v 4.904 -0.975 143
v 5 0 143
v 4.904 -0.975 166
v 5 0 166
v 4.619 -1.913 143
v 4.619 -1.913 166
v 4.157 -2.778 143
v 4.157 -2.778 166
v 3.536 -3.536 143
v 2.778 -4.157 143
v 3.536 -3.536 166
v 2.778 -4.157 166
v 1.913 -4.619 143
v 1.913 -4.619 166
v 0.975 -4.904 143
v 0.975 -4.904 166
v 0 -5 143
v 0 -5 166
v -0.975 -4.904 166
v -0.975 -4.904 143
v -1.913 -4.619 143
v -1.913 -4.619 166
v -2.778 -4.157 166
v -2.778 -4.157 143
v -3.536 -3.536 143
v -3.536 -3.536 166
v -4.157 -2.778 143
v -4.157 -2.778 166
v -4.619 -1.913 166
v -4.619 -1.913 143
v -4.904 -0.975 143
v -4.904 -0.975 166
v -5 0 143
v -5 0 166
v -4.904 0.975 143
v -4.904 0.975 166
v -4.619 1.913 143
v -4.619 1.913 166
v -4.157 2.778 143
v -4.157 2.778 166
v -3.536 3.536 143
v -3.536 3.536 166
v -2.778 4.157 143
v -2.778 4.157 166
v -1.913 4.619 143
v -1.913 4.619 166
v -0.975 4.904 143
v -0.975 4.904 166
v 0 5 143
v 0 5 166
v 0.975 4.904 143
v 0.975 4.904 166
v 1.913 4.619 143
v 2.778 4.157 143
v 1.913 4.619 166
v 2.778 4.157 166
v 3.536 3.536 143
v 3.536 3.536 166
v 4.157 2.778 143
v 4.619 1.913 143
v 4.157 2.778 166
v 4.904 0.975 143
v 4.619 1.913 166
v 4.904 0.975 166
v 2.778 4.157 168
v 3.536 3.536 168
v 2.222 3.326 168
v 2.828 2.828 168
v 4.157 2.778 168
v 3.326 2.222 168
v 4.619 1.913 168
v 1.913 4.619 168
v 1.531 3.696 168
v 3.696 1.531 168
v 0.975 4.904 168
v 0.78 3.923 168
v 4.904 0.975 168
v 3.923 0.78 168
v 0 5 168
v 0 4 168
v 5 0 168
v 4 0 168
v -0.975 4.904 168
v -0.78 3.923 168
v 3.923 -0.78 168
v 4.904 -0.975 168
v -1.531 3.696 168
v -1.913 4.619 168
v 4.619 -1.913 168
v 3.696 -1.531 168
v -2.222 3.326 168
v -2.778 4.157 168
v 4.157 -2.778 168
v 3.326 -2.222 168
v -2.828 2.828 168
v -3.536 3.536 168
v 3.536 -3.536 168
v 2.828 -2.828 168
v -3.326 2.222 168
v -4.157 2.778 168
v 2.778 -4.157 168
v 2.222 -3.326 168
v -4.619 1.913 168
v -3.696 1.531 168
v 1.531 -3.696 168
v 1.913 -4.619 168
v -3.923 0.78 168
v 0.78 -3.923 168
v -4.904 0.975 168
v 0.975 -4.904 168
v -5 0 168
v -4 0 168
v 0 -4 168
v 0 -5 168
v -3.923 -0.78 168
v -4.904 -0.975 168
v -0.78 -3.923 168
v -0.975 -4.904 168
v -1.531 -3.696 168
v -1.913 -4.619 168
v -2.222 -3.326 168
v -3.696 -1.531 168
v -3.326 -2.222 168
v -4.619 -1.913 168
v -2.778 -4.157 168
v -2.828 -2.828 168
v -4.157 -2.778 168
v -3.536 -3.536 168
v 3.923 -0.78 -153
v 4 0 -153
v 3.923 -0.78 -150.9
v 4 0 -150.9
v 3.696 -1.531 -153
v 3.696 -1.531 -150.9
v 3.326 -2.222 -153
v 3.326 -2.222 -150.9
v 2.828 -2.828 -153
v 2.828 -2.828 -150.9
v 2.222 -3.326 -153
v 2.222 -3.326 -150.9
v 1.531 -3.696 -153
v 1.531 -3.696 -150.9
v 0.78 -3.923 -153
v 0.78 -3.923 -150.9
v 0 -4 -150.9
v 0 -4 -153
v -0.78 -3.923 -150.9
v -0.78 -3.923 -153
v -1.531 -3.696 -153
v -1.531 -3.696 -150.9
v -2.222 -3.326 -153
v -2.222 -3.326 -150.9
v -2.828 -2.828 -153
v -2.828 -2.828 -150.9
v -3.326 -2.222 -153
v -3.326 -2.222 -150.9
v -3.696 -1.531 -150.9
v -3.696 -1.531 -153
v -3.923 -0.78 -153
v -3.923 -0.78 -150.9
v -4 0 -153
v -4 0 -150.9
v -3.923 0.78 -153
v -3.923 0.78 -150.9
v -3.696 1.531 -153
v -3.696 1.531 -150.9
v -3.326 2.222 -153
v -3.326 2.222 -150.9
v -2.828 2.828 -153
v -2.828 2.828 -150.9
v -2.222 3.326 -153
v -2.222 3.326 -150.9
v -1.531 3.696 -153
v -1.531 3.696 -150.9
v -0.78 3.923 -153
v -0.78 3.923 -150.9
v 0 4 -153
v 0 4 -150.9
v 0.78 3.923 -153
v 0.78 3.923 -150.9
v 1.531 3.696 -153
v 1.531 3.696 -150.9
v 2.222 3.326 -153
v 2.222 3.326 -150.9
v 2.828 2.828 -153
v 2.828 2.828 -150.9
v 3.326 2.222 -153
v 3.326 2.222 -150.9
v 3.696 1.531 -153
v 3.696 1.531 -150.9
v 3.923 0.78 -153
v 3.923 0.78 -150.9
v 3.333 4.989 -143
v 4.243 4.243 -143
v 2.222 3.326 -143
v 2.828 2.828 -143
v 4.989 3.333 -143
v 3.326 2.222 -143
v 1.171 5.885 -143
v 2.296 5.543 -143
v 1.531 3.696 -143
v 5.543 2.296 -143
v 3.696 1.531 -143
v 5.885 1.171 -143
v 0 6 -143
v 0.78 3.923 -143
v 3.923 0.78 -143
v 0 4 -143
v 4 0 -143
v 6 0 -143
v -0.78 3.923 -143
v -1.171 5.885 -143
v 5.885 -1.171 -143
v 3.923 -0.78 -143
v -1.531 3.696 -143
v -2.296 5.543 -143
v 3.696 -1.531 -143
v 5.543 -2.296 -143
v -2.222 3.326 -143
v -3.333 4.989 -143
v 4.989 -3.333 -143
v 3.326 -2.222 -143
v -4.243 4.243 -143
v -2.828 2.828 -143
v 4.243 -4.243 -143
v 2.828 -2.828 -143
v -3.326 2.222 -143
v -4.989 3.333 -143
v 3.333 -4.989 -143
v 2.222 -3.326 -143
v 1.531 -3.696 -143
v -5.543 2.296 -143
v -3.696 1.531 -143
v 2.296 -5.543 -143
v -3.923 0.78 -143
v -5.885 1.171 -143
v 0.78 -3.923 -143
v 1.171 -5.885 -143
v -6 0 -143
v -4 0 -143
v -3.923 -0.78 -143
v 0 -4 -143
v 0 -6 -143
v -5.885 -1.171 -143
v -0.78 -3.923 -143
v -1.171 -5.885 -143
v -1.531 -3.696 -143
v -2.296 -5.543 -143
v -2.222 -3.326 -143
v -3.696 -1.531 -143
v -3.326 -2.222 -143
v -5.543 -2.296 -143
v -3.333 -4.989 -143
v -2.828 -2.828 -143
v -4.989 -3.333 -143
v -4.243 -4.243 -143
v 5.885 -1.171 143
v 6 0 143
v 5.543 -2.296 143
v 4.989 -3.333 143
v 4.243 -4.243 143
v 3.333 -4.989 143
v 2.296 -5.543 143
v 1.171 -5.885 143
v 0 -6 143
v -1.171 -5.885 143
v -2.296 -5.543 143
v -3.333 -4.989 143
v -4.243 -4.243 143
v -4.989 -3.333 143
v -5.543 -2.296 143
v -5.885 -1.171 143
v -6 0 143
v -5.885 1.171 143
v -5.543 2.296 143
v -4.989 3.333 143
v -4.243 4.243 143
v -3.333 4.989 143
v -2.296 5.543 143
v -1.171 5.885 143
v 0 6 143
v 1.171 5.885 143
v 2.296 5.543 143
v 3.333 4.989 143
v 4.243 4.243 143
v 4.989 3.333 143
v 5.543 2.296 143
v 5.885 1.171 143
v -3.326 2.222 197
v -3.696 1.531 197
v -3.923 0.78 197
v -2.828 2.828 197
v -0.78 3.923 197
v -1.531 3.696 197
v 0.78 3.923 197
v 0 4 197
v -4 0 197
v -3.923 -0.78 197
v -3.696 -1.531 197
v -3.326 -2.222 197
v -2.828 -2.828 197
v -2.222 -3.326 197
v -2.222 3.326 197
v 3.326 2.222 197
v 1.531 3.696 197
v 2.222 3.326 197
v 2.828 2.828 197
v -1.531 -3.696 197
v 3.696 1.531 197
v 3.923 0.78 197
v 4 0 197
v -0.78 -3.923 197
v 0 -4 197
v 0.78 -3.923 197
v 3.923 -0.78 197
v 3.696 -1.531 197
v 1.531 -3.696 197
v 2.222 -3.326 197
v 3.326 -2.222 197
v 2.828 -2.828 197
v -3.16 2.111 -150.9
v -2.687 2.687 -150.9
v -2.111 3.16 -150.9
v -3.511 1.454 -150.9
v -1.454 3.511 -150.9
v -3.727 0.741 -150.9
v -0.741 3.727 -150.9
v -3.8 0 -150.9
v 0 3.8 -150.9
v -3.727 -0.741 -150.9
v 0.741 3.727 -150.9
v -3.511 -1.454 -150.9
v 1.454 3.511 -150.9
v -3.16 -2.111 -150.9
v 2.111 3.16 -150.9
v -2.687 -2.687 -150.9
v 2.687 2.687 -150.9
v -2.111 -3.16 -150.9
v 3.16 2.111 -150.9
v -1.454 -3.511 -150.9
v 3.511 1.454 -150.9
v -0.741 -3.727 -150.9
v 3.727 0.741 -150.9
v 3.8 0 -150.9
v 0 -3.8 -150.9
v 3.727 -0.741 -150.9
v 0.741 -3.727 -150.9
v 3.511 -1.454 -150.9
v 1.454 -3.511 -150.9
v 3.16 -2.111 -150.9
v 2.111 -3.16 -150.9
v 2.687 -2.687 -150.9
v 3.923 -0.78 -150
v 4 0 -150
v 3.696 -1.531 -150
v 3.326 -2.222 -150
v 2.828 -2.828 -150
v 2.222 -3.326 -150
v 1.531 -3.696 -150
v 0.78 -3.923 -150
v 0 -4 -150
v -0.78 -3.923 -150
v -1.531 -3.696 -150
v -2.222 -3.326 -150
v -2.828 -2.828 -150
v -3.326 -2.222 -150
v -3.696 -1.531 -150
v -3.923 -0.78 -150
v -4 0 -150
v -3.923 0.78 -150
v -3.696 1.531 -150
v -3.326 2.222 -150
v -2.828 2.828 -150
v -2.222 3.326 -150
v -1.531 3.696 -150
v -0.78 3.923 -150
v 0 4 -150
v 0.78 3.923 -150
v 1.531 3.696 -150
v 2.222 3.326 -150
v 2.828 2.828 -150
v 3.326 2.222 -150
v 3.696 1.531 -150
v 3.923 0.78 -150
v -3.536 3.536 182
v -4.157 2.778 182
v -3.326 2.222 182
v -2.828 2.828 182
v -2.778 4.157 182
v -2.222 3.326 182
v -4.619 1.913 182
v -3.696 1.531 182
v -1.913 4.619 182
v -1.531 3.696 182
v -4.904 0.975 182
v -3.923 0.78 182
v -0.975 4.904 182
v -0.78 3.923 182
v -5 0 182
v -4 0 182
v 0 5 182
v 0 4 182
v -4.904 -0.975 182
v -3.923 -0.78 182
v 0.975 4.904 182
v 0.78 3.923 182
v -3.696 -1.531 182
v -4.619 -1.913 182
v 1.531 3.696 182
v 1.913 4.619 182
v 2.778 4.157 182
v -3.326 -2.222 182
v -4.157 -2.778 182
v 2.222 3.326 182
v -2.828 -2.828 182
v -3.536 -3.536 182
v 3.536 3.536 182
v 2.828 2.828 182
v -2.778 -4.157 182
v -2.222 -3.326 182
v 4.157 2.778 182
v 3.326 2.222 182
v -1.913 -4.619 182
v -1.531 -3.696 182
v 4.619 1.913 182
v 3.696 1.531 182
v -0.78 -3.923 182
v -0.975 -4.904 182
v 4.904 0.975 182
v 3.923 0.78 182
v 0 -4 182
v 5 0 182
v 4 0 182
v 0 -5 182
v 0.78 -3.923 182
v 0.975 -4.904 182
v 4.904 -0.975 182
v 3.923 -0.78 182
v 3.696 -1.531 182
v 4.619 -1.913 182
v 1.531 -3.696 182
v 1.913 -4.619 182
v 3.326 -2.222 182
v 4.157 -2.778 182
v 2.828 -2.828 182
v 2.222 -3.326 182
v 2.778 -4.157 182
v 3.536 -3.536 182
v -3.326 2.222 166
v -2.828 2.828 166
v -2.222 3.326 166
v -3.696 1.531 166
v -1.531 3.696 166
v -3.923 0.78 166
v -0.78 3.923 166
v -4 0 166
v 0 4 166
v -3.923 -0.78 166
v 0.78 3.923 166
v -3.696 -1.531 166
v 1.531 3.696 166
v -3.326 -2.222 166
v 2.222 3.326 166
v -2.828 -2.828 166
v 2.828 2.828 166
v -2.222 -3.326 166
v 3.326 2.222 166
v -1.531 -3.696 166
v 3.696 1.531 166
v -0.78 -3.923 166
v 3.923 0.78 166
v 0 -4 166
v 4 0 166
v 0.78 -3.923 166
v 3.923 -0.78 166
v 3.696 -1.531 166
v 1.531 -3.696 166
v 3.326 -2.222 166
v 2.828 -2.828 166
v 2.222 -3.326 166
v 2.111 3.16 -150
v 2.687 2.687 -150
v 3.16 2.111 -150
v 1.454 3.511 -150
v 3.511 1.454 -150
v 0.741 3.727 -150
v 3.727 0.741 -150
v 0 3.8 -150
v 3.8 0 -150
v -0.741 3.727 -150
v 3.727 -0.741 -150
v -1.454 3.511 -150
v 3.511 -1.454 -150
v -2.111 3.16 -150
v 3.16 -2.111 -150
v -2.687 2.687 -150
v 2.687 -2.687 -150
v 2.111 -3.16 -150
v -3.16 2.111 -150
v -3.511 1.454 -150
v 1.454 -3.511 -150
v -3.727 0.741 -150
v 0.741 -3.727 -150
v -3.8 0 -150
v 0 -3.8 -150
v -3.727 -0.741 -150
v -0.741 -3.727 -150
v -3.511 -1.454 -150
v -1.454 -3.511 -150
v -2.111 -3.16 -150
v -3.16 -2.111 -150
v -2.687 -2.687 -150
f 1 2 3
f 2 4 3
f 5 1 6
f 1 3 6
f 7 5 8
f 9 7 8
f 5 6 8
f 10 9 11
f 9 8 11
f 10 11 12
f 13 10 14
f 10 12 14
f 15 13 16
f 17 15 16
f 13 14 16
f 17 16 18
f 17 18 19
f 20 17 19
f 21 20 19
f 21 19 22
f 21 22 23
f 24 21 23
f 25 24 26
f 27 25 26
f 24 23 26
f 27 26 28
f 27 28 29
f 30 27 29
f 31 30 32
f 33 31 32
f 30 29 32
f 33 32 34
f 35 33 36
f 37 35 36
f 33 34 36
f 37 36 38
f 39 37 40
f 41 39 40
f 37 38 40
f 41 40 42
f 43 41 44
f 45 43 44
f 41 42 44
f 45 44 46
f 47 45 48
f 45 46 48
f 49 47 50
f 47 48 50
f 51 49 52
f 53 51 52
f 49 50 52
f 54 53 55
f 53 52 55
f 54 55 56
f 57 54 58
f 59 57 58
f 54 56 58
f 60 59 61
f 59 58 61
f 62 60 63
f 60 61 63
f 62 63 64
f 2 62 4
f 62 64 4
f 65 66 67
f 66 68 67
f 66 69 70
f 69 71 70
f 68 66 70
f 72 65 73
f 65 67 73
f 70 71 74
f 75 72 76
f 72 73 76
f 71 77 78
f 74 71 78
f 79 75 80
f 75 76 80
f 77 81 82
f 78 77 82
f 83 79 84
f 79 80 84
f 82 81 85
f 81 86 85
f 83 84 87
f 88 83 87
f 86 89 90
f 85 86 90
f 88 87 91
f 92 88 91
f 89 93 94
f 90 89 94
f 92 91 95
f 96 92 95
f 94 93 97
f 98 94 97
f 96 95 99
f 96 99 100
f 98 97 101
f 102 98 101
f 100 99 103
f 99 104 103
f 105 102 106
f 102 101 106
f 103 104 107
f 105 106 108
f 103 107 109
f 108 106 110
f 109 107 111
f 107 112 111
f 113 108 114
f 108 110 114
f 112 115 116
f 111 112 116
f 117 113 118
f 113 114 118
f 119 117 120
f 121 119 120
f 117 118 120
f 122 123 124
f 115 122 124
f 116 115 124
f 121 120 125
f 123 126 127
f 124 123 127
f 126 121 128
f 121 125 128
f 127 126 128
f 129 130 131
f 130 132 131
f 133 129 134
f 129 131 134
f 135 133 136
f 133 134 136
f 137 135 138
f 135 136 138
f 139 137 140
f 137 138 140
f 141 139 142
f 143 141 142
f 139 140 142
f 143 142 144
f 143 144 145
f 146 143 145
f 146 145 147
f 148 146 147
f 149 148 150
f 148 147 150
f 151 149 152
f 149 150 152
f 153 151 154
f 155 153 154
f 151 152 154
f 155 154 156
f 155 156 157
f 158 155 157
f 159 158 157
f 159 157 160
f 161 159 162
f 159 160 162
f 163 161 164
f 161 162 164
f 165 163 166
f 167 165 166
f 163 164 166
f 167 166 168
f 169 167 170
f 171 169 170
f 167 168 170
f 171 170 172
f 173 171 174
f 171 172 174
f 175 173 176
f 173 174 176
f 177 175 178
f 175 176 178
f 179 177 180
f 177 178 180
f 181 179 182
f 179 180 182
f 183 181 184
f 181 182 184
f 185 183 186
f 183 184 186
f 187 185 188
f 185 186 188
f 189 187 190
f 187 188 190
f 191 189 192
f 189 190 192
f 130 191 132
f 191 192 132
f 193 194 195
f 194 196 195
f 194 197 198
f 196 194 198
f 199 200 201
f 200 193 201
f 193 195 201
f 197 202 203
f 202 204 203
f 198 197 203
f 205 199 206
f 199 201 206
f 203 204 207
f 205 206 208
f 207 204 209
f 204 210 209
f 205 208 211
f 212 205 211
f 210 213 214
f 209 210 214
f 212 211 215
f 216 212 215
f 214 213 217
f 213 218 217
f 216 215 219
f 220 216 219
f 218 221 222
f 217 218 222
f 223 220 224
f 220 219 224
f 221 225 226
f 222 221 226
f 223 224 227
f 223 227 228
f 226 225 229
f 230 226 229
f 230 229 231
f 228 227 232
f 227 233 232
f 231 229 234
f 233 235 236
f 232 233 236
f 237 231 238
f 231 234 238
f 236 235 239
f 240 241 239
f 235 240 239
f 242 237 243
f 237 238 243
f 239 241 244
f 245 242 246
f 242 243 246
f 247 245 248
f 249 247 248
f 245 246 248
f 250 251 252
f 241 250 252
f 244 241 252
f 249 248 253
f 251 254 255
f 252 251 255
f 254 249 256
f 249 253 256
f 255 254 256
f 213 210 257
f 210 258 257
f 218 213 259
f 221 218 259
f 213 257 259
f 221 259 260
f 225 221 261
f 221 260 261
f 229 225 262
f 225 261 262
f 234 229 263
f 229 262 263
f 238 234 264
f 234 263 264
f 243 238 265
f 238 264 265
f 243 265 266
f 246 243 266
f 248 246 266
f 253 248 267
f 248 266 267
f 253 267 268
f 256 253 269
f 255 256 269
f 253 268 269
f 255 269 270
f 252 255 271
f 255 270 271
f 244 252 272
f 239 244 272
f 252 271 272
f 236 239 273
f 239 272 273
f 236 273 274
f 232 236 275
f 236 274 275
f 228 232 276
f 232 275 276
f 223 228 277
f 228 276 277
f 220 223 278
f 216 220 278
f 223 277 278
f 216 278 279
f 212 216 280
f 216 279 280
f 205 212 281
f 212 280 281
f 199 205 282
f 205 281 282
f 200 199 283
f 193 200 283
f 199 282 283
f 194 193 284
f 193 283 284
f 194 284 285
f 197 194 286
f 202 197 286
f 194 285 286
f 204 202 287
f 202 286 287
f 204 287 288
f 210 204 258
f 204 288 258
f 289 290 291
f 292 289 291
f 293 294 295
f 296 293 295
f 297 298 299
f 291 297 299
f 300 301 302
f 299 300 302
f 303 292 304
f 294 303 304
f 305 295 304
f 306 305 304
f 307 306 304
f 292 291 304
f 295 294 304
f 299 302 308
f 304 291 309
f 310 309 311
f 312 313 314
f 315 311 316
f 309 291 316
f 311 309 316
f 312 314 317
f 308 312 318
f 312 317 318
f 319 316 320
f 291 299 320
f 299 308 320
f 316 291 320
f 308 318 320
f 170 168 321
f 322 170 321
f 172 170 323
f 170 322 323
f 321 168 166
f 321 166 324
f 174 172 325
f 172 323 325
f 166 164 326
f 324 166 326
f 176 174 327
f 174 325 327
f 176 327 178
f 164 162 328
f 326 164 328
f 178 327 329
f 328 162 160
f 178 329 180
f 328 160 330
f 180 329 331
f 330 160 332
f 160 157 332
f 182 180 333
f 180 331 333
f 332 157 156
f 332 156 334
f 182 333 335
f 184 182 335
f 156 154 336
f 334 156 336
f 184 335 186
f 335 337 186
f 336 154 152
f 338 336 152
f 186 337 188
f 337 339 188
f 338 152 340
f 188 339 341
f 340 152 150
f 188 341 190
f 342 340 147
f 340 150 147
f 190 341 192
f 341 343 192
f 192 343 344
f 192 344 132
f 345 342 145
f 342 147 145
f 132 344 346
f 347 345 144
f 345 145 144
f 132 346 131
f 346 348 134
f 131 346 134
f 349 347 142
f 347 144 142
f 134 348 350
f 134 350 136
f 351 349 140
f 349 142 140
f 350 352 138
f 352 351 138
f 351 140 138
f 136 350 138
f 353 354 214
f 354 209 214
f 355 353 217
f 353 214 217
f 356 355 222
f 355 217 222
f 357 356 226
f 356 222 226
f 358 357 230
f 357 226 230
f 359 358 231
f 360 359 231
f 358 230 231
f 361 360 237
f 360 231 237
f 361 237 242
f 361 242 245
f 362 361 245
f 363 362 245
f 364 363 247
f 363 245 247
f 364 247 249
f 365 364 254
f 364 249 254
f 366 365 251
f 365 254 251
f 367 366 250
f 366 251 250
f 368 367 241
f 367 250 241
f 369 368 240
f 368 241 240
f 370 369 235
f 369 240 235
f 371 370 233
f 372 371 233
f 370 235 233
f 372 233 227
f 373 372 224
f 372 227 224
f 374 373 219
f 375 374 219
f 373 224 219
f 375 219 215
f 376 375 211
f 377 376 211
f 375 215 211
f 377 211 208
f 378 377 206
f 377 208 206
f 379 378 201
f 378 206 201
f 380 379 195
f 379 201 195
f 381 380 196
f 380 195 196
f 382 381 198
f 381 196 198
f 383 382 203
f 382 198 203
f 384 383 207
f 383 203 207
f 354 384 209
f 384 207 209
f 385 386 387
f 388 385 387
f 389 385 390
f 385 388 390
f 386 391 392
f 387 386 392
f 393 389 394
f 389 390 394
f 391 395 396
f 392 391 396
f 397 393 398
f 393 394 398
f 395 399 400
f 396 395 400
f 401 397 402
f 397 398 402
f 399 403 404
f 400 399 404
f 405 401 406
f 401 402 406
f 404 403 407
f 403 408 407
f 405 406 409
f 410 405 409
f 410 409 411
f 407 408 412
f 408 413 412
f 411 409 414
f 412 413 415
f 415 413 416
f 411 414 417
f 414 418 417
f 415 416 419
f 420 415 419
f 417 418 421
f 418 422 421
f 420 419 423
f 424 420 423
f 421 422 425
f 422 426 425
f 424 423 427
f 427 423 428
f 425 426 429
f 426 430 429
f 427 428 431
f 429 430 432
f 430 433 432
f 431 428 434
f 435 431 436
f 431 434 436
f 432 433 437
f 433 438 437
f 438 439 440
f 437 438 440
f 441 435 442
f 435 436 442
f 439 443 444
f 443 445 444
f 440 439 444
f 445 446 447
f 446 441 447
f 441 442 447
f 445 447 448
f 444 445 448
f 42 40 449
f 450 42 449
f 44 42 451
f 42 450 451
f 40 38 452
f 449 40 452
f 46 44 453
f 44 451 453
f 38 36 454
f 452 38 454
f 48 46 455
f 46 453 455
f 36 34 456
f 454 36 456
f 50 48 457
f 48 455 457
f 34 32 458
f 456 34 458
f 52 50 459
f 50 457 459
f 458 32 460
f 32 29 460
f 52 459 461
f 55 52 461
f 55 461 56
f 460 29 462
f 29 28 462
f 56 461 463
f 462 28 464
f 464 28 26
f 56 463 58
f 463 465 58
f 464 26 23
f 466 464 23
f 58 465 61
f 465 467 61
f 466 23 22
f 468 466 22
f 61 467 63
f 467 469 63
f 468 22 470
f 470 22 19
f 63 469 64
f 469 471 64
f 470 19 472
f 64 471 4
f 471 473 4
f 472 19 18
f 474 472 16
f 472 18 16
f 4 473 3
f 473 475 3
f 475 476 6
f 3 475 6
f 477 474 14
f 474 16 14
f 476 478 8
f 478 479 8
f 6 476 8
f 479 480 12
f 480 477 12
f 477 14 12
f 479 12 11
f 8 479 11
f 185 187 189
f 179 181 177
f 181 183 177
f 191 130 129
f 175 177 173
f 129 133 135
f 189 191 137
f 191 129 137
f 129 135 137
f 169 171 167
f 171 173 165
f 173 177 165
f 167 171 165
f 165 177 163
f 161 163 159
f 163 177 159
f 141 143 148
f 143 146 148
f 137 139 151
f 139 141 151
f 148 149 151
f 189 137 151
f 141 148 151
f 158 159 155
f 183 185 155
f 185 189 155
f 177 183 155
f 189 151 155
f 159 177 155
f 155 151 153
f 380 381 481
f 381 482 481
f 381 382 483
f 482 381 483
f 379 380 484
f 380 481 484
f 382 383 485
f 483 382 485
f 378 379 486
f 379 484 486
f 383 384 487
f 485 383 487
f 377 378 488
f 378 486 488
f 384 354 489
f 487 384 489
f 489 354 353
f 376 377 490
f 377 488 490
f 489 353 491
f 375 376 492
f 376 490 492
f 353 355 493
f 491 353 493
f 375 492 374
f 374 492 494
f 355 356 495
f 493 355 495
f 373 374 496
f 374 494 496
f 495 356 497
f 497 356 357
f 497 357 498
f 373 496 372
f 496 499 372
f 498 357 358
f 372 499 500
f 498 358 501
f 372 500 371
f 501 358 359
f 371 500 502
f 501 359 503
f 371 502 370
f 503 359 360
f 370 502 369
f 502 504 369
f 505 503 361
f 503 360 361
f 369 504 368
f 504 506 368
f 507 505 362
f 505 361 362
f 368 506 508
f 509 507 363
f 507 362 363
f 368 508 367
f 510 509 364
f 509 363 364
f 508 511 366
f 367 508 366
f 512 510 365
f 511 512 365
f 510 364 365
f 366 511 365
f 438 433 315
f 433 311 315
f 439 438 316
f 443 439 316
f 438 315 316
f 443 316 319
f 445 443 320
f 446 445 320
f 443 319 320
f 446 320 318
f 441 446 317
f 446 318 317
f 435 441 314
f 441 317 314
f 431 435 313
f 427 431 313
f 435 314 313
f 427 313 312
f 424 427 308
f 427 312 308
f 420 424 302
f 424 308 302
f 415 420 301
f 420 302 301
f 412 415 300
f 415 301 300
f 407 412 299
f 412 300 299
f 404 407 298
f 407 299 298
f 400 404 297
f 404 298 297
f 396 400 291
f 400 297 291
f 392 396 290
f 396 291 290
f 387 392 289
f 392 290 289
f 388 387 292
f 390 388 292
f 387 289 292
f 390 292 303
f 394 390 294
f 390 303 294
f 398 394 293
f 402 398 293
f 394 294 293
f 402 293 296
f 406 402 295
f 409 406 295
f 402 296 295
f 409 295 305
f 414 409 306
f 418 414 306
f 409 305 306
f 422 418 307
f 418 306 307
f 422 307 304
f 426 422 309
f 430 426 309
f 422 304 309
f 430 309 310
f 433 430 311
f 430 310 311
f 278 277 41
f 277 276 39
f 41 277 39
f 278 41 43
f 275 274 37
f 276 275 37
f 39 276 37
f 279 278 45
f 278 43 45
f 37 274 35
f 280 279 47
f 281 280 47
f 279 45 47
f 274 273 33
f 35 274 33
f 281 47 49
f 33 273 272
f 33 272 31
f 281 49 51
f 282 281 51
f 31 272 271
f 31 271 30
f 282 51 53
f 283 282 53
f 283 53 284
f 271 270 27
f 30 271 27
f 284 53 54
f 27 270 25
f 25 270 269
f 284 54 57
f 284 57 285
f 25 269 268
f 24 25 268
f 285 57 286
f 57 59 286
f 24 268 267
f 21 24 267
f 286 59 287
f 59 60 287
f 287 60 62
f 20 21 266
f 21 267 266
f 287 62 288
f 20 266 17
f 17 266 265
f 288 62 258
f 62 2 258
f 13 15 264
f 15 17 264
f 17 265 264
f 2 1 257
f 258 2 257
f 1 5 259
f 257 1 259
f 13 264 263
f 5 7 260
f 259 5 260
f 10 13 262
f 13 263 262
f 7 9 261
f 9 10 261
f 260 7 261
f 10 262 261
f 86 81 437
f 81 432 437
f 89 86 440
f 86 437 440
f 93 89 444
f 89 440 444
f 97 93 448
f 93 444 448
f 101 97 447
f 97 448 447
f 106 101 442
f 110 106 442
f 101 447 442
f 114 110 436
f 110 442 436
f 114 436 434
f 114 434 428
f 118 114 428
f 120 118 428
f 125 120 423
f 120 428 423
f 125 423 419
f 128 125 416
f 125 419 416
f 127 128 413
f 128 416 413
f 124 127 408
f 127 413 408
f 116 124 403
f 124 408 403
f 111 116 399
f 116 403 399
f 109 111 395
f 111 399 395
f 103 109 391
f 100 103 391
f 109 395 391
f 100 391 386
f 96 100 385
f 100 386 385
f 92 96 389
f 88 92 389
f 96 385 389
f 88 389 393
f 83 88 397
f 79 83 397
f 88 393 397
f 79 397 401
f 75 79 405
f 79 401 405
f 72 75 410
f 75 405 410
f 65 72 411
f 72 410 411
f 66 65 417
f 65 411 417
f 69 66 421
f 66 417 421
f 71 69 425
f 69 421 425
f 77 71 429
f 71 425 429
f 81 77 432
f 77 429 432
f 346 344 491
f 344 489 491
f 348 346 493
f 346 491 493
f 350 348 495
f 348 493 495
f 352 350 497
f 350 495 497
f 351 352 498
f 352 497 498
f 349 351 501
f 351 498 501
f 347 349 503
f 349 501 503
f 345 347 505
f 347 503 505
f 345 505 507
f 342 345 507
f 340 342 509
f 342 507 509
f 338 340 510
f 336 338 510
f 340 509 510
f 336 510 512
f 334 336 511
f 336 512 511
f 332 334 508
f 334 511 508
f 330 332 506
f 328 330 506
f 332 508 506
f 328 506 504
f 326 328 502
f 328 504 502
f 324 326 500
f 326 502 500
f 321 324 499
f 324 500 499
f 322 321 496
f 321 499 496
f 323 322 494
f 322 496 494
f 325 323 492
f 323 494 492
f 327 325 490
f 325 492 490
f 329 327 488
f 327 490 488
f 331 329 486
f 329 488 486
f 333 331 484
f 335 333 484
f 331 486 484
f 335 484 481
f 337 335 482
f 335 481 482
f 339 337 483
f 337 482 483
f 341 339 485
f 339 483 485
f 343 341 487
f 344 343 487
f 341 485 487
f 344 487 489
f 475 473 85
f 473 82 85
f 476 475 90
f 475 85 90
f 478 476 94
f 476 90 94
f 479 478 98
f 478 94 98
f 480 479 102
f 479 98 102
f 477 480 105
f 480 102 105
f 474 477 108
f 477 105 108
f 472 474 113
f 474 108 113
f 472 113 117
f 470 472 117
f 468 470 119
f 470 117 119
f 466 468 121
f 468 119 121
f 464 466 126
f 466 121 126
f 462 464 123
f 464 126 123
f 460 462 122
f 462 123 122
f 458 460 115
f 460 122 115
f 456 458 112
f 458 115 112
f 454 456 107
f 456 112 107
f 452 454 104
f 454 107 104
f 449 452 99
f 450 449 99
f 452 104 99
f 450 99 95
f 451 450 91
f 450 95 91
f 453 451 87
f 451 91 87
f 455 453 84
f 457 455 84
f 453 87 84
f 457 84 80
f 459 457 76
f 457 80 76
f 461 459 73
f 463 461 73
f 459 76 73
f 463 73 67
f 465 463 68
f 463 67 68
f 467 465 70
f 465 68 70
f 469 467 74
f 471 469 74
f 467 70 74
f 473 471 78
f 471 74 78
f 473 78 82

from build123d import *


with BuildPart() as part:
    # Sketch1 → Revolve1 (revolve)
    with BuildSketch(Plane(origin=(0, 0, 0), x_dir=(0, 0, -1), z_dir=(1, 0, 0)), mode=Mode.PRIVATE) as revolve1_sk:
        Polygon((-197, 0), (153, 0), (153, 4), (150.9, 4), (150.9, 3.8), (150, 3.8), (150, 4), (143, 4), (143, 6), (-143, 6), (-143, 5), (-166, 5), (-166, 4), (-168, 4), (-168, 5), (-182, 5), (-182, 4), (-197, 4), align=None)
    revolve(revolve1_sk.sketch.rotate(Axis((0, 0, 197), (0, 0, -1)), 90), axis=Axis((0, 0, 197), (0, 0, -1)))


solid = part.part
